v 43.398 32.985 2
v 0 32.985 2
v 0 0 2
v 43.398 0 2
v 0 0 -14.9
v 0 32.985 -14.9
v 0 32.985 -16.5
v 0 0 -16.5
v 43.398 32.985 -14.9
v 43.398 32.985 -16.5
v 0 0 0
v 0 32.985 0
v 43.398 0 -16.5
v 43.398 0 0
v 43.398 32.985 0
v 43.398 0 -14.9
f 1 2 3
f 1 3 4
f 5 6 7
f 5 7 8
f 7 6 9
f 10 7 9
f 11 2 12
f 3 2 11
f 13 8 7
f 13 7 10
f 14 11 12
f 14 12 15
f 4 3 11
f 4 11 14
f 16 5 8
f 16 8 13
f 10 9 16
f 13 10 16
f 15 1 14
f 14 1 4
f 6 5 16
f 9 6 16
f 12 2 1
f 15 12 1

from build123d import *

# Parameters (mm, degrees)
F0_W     = 43.3976352215
F0_H     = 32.9854488373
F1_DEPTH = 2
F2_W     = 43.3976352215
F2_H     = 32.9854488373
F3_DEPTH = 16.5
F4_W     = 43.3976352215
F4_H     = 14.9
F5_DEPTH = 35


with BuildPart() as f1:
    # F0 (on Top) → F1 (new body)
    with BuildSketch(Plane.XY):
        with Locations((21.6988176107, 16.4927244186)):
            Rectangle(F0_W, F0_H)
    extrude(amount=F1_DEPTH)

    # F2 (on face) → F3 (join)
    with BuildSketch(Plane(origin=(0, 0, 0), x_dir=(1, 0, 0), z_dir=(0, 0, -1))):
        with Locations((21.6988176107, -16.4927244186)):
            Rectangle(F2_W, F2_H)
    extrude(amount=F3_DEPTH)

    # F4 (on face) → F5 (cut)
    with BuildSketch(Plane.XZ):
        with Locations((21.6988176107, -7.45)):
            Rectangle(F4_W, F4_H)
    extrude(amount=-F5_DEPTH, mode=Mode.SUBTRACT)


solid = f1.part
